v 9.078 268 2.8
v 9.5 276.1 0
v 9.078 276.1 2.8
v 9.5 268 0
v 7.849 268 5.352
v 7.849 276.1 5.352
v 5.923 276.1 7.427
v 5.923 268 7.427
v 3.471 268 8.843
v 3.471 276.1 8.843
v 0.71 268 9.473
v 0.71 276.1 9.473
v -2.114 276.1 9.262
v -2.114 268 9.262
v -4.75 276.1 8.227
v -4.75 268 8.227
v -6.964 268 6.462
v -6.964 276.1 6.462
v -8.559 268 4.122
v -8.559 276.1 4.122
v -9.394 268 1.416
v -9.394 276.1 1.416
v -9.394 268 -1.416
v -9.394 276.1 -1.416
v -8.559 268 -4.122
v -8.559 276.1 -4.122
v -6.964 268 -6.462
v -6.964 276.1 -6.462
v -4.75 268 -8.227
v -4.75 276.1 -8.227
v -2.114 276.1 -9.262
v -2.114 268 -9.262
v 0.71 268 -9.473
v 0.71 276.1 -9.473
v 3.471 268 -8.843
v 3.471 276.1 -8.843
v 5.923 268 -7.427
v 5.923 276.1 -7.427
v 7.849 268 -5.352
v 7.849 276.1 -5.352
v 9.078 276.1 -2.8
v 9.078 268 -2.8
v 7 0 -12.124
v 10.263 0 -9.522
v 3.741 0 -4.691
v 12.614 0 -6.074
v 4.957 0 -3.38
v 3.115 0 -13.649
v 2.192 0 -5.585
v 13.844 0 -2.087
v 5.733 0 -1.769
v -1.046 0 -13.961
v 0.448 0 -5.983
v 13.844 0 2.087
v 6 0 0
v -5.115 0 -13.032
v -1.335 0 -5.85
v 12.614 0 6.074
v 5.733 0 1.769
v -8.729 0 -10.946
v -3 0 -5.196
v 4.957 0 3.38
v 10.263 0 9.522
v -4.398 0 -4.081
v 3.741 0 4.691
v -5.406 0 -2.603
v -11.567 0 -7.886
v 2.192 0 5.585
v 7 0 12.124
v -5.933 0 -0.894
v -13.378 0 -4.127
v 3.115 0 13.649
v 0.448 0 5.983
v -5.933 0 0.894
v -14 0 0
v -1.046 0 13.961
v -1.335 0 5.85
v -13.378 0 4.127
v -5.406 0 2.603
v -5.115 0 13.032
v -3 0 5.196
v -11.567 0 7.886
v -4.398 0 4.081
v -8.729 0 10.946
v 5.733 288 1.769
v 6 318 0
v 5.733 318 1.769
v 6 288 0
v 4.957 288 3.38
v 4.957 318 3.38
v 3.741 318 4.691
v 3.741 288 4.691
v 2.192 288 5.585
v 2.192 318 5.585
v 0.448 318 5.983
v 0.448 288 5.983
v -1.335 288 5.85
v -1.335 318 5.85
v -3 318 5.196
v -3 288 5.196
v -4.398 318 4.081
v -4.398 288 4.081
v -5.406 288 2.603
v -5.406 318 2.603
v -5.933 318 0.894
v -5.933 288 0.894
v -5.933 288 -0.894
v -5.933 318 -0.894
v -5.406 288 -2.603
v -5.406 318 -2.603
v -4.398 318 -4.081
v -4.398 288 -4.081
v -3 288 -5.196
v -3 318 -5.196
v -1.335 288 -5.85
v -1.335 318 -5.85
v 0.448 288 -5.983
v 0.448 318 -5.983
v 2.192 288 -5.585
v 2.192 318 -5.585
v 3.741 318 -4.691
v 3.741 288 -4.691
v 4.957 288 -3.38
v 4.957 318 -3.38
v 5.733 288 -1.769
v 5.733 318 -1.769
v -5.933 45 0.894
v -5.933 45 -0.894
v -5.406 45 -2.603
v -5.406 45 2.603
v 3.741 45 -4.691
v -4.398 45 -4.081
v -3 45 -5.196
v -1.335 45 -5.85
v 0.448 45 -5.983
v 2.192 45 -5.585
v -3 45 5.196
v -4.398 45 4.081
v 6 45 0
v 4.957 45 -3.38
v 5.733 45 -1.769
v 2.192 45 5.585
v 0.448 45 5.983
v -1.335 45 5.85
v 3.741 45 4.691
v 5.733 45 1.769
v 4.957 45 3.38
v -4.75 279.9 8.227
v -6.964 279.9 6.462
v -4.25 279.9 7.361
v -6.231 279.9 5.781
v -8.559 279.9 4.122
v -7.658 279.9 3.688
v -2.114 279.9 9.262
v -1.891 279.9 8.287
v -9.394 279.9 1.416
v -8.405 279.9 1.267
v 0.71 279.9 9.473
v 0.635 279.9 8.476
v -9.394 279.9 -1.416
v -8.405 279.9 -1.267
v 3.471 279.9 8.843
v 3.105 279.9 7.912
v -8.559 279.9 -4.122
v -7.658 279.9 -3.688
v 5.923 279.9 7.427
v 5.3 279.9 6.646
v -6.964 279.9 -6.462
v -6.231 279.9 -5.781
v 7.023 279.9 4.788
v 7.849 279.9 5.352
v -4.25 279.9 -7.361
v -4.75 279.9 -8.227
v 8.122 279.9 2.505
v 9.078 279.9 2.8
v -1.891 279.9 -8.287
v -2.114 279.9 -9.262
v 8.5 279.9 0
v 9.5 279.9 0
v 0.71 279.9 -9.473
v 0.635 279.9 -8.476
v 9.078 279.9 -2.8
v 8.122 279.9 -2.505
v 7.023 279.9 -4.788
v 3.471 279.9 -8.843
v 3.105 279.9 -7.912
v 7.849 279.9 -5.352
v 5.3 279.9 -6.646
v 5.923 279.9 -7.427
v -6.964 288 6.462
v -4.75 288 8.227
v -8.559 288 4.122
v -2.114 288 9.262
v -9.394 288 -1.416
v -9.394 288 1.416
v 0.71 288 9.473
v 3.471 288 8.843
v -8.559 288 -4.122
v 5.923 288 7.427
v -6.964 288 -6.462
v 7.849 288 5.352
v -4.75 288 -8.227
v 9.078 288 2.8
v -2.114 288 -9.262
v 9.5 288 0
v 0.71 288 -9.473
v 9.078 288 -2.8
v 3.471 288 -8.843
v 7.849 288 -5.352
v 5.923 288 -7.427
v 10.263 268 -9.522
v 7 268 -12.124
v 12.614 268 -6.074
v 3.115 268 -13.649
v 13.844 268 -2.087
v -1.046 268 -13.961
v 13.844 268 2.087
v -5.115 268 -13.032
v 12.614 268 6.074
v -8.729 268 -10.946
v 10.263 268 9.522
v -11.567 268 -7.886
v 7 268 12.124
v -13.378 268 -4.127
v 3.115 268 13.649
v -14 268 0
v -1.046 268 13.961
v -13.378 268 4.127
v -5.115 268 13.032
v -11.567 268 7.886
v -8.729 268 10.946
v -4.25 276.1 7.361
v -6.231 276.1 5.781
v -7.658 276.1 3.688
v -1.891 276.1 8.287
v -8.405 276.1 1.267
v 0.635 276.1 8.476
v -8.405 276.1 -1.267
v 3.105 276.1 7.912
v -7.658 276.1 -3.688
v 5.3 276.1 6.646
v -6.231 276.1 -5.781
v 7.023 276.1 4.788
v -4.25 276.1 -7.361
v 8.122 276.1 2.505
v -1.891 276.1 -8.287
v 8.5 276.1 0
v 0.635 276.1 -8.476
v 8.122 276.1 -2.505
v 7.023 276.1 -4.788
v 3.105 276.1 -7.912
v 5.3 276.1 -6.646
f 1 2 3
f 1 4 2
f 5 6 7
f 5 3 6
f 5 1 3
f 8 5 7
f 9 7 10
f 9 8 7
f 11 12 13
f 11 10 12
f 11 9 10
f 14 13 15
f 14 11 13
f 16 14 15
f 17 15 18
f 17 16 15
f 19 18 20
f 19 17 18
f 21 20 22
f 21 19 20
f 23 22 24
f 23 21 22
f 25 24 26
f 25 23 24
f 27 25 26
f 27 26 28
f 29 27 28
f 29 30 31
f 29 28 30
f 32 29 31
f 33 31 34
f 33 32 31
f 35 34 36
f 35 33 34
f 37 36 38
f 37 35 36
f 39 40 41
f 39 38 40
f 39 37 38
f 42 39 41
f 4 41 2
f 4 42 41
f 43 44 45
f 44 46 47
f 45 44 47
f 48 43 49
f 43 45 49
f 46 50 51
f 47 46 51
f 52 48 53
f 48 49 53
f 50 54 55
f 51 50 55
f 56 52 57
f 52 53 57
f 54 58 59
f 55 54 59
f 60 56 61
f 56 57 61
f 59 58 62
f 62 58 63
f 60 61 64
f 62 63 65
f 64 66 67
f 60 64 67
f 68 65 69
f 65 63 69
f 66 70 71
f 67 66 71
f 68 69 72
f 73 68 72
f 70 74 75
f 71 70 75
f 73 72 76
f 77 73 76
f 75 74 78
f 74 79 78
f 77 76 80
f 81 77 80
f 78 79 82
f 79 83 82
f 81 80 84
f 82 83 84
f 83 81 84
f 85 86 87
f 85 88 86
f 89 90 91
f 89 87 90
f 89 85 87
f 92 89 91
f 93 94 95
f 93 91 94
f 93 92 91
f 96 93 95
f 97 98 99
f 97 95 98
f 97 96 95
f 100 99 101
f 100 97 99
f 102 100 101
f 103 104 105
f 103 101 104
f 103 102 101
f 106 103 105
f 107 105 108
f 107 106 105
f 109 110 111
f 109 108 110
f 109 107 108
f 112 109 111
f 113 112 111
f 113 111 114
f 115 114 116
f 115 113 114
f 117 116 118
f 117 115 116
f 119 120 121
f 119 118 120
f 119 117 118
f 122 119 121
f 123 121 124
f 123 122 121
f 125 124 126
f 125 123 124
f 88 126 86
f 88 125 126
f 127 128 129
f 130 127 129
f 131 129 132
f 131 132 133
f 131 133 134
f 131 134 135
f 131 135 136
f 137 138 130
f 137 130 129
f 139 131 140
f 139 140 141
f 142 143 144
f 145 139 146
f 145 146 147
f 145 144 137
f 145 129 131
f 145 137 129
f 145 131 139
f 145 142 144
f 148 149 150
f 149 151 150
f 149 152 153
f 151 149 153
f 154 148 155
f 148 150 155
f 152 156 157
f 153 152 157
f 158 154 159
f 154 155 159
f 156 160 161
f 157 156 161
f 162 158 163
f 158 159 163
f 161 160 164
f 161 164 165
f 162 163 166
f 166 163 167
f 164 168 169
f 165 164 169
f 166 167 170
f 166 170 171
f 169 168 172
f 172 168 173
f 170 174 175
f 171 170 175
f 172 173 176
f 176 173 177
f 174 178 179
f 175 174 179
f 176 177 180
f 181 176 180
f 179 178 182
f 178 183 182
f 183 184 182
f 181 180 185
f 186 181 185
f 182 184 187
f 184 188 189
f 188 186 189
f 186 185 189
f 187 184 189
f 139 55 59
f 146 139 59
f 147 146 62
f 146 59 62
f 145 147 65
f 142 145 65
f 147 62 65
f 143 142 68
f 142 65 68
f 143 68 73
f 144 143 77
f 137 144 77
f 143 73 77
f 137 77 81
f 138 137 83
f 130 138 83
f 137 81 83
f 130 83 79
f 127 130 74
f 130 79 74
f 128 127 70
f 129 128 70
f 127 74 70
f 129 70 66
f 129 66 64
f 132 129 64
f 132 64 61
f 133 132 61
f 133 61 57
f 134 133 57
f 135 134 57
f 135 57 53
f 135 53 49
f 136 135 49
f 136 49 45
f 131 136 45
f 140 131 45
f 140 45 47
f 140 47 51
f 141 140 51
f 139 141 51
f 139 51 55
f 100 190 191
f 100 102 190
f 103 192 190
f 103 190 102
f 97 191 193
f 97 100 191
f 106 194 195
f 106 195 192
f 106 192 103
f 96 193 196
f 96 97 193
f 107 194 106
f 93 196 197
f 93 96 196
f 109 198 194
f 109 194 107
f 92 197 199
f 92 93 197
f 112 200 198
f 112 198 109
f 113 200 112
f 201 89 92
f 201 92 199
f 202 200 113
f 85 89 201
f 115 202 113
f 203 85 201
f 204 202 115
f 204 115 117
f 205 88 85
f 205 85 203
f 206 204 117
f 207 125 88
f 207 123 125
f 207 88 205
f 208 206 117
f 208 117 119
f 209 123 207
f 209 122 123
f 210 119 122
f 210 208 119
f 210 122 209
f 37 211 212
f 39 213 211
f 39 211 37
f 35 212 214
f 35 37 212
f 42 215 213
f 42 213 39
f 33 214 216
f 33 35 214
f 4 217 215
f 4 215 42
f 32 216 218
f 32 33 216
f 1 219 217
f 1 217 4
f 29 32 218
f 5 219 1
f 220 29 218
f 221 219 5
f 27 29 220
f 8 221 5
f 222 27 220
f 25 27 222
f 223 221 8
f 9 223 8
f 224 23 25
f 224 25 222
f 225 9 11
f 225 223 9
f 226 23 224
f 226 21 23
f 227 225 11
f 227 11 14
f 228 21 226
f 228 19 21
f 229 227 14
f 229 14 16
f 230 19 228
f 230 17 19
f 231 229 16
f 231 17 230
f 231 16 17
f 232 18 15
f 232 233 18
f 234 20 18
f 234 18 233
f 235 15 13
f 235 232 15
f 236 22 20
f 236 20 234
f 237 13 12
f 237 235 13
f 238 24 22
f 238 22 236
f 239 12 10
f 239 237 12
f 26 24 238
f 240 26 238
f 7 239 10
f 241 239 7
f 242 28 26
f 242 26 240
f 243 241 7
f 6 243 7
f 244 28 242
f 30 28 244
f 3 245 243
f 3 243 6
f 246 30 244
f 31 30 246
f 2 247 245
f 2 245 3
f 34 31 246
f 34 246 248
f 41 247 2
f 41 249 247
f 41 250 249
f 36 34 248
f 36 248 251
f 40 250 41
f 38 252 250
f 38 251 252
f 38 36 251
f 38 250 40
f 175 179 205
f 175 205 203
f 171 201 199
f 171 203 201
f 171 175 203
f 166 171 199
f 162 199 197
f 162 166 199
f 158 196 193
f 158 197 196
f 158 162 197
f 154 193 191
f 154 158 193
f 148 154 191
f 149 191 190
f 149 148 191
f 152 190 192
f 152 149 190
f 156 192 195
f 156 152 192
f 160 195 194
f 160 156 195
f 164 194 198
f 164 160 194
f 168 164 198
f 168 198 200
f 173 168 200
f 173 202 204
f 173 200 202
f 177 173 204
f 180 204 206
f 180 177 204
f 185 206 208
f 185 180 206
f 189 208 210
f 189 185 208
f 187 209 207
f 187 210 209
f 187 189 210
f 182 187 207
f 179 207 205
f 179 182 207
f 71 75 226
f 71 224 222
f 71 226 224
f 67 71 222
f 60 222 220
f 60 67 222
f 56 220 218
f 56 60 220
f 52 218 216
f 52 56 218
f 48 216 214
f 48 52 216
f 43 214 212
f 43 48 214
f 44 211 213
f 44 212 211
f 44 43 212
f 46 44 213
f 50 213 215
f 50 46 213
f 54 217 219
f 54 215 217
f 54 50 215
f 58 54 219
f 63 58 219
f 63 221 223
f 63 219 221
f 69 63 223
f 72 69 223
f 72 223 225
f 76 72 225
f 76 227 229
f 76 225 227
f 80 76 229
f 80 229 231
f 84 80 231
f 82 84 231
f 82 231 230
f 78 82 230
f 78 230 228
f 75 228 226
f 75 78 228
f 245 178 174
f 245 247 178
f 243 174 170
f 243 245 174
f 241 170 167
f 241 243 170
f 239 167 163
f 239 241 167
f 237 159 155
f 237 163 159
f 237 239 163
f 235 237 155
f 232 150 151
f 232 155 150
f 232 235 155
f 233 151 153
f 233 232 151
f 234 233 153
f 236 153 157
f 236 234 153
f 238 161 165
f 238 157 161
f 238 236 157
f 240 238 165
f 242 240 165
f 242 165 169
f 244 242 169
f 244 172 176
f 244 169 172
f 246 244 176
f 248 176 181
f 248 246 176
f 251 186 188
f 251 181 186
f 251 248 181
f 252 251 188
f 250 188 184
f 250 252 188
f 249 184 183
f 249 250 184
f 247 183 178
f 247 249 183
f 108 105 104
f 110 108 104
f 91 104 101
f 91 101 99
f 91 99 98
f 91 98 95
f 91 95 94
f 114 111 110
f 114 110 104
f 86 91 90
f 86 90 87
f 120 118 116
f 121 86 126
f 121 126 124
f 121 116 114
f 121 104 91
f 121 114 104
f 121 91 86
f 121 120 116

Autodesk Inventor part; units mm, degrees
ref_plane "YZ Plane" through (0, 0, 0) normal (1, 0, 0) x (0, 1, 0)
ref_plane "XZ Plane" through (0, 0, 0) normal (0, 1, 0) x (-1, 0, 0)
ref_plane "XY Plane" through (0, 0, 0) normal (0, 0, 1) x (1, 0, 0)
sketch "Sketch1" plane through (0, 0, 0) normal (0, 1, 0) x (-1, 0, 0)
  circle A0 centre (0, 0) radius 14
  dimension "d0" = 28
extrude "Extrusion1" add sketch "Sketch1" along normal blind 268
sketch "Sketch5" plane through (0, 268, 0) normal (0, 1, 0) x (1, 0, 0)
  point P0 (0, 0)
sketch "Sketch6" plane through (0, 0, 0) normal (1, 0, 0) x (0, 1, 0)
  point P0 (0, 0)
sketch "Sketch7" plane through (0, 268, 0) normal (0, 1, 0) x (1, 0, 0)
  circle A0 centre (0, 0) radius 9.5
  dimension "d13" = 19
extrude "Extrusion3" add sketch "Sketch7" along normal blind 8.1
sketch "Sketch8" plane through (0, 276.1, 0) normal (0, 1, 0) x (1, 0, 0)
  circle A0 centre (0, 0) radius 8.5
  dimension "d16" = 17
extrude "Extrusion4" add sketch "Sketch8" along normal blind 3.8
sketch "Sketch9" plane through (0, 279.9, 0) normal (0, 1, 0) x (1, 0, 0)
  circle A0 centre (0, 0) radius 9.5
  dimension "d19" = 19
extrude "Extrusion5" add sketch "Sketch9" along normal blind 8.1
sketch "Sketch10" plane through (0, 288, 0) normal (0, 1, 0) x (1, 0, 0)
  circle A0 centre (0, 0) radius 6
  dimension "d22" = 12
extrude "Extrusion6" add sketch "Sketch10" along normal blind 30
sketch "Sketch11" plane through (0, 0, 0) normal (0, -1, 0) x (1, 0, 0)
  circle A0 centre (0, 0) radius 6
  dimension "d25" = 12
extrude "Extrusion7" cut sketch "Sketch11" against normal blind 45
thread "Thread1" size "M12x1" class "6H" standard "ANSI Metric M Profile" full length
thread "Thread2" size "M12x1" class "6g" standard "ANSI Metric M Profile" full length
properties part number "Hydraulic cylinder part 3"
